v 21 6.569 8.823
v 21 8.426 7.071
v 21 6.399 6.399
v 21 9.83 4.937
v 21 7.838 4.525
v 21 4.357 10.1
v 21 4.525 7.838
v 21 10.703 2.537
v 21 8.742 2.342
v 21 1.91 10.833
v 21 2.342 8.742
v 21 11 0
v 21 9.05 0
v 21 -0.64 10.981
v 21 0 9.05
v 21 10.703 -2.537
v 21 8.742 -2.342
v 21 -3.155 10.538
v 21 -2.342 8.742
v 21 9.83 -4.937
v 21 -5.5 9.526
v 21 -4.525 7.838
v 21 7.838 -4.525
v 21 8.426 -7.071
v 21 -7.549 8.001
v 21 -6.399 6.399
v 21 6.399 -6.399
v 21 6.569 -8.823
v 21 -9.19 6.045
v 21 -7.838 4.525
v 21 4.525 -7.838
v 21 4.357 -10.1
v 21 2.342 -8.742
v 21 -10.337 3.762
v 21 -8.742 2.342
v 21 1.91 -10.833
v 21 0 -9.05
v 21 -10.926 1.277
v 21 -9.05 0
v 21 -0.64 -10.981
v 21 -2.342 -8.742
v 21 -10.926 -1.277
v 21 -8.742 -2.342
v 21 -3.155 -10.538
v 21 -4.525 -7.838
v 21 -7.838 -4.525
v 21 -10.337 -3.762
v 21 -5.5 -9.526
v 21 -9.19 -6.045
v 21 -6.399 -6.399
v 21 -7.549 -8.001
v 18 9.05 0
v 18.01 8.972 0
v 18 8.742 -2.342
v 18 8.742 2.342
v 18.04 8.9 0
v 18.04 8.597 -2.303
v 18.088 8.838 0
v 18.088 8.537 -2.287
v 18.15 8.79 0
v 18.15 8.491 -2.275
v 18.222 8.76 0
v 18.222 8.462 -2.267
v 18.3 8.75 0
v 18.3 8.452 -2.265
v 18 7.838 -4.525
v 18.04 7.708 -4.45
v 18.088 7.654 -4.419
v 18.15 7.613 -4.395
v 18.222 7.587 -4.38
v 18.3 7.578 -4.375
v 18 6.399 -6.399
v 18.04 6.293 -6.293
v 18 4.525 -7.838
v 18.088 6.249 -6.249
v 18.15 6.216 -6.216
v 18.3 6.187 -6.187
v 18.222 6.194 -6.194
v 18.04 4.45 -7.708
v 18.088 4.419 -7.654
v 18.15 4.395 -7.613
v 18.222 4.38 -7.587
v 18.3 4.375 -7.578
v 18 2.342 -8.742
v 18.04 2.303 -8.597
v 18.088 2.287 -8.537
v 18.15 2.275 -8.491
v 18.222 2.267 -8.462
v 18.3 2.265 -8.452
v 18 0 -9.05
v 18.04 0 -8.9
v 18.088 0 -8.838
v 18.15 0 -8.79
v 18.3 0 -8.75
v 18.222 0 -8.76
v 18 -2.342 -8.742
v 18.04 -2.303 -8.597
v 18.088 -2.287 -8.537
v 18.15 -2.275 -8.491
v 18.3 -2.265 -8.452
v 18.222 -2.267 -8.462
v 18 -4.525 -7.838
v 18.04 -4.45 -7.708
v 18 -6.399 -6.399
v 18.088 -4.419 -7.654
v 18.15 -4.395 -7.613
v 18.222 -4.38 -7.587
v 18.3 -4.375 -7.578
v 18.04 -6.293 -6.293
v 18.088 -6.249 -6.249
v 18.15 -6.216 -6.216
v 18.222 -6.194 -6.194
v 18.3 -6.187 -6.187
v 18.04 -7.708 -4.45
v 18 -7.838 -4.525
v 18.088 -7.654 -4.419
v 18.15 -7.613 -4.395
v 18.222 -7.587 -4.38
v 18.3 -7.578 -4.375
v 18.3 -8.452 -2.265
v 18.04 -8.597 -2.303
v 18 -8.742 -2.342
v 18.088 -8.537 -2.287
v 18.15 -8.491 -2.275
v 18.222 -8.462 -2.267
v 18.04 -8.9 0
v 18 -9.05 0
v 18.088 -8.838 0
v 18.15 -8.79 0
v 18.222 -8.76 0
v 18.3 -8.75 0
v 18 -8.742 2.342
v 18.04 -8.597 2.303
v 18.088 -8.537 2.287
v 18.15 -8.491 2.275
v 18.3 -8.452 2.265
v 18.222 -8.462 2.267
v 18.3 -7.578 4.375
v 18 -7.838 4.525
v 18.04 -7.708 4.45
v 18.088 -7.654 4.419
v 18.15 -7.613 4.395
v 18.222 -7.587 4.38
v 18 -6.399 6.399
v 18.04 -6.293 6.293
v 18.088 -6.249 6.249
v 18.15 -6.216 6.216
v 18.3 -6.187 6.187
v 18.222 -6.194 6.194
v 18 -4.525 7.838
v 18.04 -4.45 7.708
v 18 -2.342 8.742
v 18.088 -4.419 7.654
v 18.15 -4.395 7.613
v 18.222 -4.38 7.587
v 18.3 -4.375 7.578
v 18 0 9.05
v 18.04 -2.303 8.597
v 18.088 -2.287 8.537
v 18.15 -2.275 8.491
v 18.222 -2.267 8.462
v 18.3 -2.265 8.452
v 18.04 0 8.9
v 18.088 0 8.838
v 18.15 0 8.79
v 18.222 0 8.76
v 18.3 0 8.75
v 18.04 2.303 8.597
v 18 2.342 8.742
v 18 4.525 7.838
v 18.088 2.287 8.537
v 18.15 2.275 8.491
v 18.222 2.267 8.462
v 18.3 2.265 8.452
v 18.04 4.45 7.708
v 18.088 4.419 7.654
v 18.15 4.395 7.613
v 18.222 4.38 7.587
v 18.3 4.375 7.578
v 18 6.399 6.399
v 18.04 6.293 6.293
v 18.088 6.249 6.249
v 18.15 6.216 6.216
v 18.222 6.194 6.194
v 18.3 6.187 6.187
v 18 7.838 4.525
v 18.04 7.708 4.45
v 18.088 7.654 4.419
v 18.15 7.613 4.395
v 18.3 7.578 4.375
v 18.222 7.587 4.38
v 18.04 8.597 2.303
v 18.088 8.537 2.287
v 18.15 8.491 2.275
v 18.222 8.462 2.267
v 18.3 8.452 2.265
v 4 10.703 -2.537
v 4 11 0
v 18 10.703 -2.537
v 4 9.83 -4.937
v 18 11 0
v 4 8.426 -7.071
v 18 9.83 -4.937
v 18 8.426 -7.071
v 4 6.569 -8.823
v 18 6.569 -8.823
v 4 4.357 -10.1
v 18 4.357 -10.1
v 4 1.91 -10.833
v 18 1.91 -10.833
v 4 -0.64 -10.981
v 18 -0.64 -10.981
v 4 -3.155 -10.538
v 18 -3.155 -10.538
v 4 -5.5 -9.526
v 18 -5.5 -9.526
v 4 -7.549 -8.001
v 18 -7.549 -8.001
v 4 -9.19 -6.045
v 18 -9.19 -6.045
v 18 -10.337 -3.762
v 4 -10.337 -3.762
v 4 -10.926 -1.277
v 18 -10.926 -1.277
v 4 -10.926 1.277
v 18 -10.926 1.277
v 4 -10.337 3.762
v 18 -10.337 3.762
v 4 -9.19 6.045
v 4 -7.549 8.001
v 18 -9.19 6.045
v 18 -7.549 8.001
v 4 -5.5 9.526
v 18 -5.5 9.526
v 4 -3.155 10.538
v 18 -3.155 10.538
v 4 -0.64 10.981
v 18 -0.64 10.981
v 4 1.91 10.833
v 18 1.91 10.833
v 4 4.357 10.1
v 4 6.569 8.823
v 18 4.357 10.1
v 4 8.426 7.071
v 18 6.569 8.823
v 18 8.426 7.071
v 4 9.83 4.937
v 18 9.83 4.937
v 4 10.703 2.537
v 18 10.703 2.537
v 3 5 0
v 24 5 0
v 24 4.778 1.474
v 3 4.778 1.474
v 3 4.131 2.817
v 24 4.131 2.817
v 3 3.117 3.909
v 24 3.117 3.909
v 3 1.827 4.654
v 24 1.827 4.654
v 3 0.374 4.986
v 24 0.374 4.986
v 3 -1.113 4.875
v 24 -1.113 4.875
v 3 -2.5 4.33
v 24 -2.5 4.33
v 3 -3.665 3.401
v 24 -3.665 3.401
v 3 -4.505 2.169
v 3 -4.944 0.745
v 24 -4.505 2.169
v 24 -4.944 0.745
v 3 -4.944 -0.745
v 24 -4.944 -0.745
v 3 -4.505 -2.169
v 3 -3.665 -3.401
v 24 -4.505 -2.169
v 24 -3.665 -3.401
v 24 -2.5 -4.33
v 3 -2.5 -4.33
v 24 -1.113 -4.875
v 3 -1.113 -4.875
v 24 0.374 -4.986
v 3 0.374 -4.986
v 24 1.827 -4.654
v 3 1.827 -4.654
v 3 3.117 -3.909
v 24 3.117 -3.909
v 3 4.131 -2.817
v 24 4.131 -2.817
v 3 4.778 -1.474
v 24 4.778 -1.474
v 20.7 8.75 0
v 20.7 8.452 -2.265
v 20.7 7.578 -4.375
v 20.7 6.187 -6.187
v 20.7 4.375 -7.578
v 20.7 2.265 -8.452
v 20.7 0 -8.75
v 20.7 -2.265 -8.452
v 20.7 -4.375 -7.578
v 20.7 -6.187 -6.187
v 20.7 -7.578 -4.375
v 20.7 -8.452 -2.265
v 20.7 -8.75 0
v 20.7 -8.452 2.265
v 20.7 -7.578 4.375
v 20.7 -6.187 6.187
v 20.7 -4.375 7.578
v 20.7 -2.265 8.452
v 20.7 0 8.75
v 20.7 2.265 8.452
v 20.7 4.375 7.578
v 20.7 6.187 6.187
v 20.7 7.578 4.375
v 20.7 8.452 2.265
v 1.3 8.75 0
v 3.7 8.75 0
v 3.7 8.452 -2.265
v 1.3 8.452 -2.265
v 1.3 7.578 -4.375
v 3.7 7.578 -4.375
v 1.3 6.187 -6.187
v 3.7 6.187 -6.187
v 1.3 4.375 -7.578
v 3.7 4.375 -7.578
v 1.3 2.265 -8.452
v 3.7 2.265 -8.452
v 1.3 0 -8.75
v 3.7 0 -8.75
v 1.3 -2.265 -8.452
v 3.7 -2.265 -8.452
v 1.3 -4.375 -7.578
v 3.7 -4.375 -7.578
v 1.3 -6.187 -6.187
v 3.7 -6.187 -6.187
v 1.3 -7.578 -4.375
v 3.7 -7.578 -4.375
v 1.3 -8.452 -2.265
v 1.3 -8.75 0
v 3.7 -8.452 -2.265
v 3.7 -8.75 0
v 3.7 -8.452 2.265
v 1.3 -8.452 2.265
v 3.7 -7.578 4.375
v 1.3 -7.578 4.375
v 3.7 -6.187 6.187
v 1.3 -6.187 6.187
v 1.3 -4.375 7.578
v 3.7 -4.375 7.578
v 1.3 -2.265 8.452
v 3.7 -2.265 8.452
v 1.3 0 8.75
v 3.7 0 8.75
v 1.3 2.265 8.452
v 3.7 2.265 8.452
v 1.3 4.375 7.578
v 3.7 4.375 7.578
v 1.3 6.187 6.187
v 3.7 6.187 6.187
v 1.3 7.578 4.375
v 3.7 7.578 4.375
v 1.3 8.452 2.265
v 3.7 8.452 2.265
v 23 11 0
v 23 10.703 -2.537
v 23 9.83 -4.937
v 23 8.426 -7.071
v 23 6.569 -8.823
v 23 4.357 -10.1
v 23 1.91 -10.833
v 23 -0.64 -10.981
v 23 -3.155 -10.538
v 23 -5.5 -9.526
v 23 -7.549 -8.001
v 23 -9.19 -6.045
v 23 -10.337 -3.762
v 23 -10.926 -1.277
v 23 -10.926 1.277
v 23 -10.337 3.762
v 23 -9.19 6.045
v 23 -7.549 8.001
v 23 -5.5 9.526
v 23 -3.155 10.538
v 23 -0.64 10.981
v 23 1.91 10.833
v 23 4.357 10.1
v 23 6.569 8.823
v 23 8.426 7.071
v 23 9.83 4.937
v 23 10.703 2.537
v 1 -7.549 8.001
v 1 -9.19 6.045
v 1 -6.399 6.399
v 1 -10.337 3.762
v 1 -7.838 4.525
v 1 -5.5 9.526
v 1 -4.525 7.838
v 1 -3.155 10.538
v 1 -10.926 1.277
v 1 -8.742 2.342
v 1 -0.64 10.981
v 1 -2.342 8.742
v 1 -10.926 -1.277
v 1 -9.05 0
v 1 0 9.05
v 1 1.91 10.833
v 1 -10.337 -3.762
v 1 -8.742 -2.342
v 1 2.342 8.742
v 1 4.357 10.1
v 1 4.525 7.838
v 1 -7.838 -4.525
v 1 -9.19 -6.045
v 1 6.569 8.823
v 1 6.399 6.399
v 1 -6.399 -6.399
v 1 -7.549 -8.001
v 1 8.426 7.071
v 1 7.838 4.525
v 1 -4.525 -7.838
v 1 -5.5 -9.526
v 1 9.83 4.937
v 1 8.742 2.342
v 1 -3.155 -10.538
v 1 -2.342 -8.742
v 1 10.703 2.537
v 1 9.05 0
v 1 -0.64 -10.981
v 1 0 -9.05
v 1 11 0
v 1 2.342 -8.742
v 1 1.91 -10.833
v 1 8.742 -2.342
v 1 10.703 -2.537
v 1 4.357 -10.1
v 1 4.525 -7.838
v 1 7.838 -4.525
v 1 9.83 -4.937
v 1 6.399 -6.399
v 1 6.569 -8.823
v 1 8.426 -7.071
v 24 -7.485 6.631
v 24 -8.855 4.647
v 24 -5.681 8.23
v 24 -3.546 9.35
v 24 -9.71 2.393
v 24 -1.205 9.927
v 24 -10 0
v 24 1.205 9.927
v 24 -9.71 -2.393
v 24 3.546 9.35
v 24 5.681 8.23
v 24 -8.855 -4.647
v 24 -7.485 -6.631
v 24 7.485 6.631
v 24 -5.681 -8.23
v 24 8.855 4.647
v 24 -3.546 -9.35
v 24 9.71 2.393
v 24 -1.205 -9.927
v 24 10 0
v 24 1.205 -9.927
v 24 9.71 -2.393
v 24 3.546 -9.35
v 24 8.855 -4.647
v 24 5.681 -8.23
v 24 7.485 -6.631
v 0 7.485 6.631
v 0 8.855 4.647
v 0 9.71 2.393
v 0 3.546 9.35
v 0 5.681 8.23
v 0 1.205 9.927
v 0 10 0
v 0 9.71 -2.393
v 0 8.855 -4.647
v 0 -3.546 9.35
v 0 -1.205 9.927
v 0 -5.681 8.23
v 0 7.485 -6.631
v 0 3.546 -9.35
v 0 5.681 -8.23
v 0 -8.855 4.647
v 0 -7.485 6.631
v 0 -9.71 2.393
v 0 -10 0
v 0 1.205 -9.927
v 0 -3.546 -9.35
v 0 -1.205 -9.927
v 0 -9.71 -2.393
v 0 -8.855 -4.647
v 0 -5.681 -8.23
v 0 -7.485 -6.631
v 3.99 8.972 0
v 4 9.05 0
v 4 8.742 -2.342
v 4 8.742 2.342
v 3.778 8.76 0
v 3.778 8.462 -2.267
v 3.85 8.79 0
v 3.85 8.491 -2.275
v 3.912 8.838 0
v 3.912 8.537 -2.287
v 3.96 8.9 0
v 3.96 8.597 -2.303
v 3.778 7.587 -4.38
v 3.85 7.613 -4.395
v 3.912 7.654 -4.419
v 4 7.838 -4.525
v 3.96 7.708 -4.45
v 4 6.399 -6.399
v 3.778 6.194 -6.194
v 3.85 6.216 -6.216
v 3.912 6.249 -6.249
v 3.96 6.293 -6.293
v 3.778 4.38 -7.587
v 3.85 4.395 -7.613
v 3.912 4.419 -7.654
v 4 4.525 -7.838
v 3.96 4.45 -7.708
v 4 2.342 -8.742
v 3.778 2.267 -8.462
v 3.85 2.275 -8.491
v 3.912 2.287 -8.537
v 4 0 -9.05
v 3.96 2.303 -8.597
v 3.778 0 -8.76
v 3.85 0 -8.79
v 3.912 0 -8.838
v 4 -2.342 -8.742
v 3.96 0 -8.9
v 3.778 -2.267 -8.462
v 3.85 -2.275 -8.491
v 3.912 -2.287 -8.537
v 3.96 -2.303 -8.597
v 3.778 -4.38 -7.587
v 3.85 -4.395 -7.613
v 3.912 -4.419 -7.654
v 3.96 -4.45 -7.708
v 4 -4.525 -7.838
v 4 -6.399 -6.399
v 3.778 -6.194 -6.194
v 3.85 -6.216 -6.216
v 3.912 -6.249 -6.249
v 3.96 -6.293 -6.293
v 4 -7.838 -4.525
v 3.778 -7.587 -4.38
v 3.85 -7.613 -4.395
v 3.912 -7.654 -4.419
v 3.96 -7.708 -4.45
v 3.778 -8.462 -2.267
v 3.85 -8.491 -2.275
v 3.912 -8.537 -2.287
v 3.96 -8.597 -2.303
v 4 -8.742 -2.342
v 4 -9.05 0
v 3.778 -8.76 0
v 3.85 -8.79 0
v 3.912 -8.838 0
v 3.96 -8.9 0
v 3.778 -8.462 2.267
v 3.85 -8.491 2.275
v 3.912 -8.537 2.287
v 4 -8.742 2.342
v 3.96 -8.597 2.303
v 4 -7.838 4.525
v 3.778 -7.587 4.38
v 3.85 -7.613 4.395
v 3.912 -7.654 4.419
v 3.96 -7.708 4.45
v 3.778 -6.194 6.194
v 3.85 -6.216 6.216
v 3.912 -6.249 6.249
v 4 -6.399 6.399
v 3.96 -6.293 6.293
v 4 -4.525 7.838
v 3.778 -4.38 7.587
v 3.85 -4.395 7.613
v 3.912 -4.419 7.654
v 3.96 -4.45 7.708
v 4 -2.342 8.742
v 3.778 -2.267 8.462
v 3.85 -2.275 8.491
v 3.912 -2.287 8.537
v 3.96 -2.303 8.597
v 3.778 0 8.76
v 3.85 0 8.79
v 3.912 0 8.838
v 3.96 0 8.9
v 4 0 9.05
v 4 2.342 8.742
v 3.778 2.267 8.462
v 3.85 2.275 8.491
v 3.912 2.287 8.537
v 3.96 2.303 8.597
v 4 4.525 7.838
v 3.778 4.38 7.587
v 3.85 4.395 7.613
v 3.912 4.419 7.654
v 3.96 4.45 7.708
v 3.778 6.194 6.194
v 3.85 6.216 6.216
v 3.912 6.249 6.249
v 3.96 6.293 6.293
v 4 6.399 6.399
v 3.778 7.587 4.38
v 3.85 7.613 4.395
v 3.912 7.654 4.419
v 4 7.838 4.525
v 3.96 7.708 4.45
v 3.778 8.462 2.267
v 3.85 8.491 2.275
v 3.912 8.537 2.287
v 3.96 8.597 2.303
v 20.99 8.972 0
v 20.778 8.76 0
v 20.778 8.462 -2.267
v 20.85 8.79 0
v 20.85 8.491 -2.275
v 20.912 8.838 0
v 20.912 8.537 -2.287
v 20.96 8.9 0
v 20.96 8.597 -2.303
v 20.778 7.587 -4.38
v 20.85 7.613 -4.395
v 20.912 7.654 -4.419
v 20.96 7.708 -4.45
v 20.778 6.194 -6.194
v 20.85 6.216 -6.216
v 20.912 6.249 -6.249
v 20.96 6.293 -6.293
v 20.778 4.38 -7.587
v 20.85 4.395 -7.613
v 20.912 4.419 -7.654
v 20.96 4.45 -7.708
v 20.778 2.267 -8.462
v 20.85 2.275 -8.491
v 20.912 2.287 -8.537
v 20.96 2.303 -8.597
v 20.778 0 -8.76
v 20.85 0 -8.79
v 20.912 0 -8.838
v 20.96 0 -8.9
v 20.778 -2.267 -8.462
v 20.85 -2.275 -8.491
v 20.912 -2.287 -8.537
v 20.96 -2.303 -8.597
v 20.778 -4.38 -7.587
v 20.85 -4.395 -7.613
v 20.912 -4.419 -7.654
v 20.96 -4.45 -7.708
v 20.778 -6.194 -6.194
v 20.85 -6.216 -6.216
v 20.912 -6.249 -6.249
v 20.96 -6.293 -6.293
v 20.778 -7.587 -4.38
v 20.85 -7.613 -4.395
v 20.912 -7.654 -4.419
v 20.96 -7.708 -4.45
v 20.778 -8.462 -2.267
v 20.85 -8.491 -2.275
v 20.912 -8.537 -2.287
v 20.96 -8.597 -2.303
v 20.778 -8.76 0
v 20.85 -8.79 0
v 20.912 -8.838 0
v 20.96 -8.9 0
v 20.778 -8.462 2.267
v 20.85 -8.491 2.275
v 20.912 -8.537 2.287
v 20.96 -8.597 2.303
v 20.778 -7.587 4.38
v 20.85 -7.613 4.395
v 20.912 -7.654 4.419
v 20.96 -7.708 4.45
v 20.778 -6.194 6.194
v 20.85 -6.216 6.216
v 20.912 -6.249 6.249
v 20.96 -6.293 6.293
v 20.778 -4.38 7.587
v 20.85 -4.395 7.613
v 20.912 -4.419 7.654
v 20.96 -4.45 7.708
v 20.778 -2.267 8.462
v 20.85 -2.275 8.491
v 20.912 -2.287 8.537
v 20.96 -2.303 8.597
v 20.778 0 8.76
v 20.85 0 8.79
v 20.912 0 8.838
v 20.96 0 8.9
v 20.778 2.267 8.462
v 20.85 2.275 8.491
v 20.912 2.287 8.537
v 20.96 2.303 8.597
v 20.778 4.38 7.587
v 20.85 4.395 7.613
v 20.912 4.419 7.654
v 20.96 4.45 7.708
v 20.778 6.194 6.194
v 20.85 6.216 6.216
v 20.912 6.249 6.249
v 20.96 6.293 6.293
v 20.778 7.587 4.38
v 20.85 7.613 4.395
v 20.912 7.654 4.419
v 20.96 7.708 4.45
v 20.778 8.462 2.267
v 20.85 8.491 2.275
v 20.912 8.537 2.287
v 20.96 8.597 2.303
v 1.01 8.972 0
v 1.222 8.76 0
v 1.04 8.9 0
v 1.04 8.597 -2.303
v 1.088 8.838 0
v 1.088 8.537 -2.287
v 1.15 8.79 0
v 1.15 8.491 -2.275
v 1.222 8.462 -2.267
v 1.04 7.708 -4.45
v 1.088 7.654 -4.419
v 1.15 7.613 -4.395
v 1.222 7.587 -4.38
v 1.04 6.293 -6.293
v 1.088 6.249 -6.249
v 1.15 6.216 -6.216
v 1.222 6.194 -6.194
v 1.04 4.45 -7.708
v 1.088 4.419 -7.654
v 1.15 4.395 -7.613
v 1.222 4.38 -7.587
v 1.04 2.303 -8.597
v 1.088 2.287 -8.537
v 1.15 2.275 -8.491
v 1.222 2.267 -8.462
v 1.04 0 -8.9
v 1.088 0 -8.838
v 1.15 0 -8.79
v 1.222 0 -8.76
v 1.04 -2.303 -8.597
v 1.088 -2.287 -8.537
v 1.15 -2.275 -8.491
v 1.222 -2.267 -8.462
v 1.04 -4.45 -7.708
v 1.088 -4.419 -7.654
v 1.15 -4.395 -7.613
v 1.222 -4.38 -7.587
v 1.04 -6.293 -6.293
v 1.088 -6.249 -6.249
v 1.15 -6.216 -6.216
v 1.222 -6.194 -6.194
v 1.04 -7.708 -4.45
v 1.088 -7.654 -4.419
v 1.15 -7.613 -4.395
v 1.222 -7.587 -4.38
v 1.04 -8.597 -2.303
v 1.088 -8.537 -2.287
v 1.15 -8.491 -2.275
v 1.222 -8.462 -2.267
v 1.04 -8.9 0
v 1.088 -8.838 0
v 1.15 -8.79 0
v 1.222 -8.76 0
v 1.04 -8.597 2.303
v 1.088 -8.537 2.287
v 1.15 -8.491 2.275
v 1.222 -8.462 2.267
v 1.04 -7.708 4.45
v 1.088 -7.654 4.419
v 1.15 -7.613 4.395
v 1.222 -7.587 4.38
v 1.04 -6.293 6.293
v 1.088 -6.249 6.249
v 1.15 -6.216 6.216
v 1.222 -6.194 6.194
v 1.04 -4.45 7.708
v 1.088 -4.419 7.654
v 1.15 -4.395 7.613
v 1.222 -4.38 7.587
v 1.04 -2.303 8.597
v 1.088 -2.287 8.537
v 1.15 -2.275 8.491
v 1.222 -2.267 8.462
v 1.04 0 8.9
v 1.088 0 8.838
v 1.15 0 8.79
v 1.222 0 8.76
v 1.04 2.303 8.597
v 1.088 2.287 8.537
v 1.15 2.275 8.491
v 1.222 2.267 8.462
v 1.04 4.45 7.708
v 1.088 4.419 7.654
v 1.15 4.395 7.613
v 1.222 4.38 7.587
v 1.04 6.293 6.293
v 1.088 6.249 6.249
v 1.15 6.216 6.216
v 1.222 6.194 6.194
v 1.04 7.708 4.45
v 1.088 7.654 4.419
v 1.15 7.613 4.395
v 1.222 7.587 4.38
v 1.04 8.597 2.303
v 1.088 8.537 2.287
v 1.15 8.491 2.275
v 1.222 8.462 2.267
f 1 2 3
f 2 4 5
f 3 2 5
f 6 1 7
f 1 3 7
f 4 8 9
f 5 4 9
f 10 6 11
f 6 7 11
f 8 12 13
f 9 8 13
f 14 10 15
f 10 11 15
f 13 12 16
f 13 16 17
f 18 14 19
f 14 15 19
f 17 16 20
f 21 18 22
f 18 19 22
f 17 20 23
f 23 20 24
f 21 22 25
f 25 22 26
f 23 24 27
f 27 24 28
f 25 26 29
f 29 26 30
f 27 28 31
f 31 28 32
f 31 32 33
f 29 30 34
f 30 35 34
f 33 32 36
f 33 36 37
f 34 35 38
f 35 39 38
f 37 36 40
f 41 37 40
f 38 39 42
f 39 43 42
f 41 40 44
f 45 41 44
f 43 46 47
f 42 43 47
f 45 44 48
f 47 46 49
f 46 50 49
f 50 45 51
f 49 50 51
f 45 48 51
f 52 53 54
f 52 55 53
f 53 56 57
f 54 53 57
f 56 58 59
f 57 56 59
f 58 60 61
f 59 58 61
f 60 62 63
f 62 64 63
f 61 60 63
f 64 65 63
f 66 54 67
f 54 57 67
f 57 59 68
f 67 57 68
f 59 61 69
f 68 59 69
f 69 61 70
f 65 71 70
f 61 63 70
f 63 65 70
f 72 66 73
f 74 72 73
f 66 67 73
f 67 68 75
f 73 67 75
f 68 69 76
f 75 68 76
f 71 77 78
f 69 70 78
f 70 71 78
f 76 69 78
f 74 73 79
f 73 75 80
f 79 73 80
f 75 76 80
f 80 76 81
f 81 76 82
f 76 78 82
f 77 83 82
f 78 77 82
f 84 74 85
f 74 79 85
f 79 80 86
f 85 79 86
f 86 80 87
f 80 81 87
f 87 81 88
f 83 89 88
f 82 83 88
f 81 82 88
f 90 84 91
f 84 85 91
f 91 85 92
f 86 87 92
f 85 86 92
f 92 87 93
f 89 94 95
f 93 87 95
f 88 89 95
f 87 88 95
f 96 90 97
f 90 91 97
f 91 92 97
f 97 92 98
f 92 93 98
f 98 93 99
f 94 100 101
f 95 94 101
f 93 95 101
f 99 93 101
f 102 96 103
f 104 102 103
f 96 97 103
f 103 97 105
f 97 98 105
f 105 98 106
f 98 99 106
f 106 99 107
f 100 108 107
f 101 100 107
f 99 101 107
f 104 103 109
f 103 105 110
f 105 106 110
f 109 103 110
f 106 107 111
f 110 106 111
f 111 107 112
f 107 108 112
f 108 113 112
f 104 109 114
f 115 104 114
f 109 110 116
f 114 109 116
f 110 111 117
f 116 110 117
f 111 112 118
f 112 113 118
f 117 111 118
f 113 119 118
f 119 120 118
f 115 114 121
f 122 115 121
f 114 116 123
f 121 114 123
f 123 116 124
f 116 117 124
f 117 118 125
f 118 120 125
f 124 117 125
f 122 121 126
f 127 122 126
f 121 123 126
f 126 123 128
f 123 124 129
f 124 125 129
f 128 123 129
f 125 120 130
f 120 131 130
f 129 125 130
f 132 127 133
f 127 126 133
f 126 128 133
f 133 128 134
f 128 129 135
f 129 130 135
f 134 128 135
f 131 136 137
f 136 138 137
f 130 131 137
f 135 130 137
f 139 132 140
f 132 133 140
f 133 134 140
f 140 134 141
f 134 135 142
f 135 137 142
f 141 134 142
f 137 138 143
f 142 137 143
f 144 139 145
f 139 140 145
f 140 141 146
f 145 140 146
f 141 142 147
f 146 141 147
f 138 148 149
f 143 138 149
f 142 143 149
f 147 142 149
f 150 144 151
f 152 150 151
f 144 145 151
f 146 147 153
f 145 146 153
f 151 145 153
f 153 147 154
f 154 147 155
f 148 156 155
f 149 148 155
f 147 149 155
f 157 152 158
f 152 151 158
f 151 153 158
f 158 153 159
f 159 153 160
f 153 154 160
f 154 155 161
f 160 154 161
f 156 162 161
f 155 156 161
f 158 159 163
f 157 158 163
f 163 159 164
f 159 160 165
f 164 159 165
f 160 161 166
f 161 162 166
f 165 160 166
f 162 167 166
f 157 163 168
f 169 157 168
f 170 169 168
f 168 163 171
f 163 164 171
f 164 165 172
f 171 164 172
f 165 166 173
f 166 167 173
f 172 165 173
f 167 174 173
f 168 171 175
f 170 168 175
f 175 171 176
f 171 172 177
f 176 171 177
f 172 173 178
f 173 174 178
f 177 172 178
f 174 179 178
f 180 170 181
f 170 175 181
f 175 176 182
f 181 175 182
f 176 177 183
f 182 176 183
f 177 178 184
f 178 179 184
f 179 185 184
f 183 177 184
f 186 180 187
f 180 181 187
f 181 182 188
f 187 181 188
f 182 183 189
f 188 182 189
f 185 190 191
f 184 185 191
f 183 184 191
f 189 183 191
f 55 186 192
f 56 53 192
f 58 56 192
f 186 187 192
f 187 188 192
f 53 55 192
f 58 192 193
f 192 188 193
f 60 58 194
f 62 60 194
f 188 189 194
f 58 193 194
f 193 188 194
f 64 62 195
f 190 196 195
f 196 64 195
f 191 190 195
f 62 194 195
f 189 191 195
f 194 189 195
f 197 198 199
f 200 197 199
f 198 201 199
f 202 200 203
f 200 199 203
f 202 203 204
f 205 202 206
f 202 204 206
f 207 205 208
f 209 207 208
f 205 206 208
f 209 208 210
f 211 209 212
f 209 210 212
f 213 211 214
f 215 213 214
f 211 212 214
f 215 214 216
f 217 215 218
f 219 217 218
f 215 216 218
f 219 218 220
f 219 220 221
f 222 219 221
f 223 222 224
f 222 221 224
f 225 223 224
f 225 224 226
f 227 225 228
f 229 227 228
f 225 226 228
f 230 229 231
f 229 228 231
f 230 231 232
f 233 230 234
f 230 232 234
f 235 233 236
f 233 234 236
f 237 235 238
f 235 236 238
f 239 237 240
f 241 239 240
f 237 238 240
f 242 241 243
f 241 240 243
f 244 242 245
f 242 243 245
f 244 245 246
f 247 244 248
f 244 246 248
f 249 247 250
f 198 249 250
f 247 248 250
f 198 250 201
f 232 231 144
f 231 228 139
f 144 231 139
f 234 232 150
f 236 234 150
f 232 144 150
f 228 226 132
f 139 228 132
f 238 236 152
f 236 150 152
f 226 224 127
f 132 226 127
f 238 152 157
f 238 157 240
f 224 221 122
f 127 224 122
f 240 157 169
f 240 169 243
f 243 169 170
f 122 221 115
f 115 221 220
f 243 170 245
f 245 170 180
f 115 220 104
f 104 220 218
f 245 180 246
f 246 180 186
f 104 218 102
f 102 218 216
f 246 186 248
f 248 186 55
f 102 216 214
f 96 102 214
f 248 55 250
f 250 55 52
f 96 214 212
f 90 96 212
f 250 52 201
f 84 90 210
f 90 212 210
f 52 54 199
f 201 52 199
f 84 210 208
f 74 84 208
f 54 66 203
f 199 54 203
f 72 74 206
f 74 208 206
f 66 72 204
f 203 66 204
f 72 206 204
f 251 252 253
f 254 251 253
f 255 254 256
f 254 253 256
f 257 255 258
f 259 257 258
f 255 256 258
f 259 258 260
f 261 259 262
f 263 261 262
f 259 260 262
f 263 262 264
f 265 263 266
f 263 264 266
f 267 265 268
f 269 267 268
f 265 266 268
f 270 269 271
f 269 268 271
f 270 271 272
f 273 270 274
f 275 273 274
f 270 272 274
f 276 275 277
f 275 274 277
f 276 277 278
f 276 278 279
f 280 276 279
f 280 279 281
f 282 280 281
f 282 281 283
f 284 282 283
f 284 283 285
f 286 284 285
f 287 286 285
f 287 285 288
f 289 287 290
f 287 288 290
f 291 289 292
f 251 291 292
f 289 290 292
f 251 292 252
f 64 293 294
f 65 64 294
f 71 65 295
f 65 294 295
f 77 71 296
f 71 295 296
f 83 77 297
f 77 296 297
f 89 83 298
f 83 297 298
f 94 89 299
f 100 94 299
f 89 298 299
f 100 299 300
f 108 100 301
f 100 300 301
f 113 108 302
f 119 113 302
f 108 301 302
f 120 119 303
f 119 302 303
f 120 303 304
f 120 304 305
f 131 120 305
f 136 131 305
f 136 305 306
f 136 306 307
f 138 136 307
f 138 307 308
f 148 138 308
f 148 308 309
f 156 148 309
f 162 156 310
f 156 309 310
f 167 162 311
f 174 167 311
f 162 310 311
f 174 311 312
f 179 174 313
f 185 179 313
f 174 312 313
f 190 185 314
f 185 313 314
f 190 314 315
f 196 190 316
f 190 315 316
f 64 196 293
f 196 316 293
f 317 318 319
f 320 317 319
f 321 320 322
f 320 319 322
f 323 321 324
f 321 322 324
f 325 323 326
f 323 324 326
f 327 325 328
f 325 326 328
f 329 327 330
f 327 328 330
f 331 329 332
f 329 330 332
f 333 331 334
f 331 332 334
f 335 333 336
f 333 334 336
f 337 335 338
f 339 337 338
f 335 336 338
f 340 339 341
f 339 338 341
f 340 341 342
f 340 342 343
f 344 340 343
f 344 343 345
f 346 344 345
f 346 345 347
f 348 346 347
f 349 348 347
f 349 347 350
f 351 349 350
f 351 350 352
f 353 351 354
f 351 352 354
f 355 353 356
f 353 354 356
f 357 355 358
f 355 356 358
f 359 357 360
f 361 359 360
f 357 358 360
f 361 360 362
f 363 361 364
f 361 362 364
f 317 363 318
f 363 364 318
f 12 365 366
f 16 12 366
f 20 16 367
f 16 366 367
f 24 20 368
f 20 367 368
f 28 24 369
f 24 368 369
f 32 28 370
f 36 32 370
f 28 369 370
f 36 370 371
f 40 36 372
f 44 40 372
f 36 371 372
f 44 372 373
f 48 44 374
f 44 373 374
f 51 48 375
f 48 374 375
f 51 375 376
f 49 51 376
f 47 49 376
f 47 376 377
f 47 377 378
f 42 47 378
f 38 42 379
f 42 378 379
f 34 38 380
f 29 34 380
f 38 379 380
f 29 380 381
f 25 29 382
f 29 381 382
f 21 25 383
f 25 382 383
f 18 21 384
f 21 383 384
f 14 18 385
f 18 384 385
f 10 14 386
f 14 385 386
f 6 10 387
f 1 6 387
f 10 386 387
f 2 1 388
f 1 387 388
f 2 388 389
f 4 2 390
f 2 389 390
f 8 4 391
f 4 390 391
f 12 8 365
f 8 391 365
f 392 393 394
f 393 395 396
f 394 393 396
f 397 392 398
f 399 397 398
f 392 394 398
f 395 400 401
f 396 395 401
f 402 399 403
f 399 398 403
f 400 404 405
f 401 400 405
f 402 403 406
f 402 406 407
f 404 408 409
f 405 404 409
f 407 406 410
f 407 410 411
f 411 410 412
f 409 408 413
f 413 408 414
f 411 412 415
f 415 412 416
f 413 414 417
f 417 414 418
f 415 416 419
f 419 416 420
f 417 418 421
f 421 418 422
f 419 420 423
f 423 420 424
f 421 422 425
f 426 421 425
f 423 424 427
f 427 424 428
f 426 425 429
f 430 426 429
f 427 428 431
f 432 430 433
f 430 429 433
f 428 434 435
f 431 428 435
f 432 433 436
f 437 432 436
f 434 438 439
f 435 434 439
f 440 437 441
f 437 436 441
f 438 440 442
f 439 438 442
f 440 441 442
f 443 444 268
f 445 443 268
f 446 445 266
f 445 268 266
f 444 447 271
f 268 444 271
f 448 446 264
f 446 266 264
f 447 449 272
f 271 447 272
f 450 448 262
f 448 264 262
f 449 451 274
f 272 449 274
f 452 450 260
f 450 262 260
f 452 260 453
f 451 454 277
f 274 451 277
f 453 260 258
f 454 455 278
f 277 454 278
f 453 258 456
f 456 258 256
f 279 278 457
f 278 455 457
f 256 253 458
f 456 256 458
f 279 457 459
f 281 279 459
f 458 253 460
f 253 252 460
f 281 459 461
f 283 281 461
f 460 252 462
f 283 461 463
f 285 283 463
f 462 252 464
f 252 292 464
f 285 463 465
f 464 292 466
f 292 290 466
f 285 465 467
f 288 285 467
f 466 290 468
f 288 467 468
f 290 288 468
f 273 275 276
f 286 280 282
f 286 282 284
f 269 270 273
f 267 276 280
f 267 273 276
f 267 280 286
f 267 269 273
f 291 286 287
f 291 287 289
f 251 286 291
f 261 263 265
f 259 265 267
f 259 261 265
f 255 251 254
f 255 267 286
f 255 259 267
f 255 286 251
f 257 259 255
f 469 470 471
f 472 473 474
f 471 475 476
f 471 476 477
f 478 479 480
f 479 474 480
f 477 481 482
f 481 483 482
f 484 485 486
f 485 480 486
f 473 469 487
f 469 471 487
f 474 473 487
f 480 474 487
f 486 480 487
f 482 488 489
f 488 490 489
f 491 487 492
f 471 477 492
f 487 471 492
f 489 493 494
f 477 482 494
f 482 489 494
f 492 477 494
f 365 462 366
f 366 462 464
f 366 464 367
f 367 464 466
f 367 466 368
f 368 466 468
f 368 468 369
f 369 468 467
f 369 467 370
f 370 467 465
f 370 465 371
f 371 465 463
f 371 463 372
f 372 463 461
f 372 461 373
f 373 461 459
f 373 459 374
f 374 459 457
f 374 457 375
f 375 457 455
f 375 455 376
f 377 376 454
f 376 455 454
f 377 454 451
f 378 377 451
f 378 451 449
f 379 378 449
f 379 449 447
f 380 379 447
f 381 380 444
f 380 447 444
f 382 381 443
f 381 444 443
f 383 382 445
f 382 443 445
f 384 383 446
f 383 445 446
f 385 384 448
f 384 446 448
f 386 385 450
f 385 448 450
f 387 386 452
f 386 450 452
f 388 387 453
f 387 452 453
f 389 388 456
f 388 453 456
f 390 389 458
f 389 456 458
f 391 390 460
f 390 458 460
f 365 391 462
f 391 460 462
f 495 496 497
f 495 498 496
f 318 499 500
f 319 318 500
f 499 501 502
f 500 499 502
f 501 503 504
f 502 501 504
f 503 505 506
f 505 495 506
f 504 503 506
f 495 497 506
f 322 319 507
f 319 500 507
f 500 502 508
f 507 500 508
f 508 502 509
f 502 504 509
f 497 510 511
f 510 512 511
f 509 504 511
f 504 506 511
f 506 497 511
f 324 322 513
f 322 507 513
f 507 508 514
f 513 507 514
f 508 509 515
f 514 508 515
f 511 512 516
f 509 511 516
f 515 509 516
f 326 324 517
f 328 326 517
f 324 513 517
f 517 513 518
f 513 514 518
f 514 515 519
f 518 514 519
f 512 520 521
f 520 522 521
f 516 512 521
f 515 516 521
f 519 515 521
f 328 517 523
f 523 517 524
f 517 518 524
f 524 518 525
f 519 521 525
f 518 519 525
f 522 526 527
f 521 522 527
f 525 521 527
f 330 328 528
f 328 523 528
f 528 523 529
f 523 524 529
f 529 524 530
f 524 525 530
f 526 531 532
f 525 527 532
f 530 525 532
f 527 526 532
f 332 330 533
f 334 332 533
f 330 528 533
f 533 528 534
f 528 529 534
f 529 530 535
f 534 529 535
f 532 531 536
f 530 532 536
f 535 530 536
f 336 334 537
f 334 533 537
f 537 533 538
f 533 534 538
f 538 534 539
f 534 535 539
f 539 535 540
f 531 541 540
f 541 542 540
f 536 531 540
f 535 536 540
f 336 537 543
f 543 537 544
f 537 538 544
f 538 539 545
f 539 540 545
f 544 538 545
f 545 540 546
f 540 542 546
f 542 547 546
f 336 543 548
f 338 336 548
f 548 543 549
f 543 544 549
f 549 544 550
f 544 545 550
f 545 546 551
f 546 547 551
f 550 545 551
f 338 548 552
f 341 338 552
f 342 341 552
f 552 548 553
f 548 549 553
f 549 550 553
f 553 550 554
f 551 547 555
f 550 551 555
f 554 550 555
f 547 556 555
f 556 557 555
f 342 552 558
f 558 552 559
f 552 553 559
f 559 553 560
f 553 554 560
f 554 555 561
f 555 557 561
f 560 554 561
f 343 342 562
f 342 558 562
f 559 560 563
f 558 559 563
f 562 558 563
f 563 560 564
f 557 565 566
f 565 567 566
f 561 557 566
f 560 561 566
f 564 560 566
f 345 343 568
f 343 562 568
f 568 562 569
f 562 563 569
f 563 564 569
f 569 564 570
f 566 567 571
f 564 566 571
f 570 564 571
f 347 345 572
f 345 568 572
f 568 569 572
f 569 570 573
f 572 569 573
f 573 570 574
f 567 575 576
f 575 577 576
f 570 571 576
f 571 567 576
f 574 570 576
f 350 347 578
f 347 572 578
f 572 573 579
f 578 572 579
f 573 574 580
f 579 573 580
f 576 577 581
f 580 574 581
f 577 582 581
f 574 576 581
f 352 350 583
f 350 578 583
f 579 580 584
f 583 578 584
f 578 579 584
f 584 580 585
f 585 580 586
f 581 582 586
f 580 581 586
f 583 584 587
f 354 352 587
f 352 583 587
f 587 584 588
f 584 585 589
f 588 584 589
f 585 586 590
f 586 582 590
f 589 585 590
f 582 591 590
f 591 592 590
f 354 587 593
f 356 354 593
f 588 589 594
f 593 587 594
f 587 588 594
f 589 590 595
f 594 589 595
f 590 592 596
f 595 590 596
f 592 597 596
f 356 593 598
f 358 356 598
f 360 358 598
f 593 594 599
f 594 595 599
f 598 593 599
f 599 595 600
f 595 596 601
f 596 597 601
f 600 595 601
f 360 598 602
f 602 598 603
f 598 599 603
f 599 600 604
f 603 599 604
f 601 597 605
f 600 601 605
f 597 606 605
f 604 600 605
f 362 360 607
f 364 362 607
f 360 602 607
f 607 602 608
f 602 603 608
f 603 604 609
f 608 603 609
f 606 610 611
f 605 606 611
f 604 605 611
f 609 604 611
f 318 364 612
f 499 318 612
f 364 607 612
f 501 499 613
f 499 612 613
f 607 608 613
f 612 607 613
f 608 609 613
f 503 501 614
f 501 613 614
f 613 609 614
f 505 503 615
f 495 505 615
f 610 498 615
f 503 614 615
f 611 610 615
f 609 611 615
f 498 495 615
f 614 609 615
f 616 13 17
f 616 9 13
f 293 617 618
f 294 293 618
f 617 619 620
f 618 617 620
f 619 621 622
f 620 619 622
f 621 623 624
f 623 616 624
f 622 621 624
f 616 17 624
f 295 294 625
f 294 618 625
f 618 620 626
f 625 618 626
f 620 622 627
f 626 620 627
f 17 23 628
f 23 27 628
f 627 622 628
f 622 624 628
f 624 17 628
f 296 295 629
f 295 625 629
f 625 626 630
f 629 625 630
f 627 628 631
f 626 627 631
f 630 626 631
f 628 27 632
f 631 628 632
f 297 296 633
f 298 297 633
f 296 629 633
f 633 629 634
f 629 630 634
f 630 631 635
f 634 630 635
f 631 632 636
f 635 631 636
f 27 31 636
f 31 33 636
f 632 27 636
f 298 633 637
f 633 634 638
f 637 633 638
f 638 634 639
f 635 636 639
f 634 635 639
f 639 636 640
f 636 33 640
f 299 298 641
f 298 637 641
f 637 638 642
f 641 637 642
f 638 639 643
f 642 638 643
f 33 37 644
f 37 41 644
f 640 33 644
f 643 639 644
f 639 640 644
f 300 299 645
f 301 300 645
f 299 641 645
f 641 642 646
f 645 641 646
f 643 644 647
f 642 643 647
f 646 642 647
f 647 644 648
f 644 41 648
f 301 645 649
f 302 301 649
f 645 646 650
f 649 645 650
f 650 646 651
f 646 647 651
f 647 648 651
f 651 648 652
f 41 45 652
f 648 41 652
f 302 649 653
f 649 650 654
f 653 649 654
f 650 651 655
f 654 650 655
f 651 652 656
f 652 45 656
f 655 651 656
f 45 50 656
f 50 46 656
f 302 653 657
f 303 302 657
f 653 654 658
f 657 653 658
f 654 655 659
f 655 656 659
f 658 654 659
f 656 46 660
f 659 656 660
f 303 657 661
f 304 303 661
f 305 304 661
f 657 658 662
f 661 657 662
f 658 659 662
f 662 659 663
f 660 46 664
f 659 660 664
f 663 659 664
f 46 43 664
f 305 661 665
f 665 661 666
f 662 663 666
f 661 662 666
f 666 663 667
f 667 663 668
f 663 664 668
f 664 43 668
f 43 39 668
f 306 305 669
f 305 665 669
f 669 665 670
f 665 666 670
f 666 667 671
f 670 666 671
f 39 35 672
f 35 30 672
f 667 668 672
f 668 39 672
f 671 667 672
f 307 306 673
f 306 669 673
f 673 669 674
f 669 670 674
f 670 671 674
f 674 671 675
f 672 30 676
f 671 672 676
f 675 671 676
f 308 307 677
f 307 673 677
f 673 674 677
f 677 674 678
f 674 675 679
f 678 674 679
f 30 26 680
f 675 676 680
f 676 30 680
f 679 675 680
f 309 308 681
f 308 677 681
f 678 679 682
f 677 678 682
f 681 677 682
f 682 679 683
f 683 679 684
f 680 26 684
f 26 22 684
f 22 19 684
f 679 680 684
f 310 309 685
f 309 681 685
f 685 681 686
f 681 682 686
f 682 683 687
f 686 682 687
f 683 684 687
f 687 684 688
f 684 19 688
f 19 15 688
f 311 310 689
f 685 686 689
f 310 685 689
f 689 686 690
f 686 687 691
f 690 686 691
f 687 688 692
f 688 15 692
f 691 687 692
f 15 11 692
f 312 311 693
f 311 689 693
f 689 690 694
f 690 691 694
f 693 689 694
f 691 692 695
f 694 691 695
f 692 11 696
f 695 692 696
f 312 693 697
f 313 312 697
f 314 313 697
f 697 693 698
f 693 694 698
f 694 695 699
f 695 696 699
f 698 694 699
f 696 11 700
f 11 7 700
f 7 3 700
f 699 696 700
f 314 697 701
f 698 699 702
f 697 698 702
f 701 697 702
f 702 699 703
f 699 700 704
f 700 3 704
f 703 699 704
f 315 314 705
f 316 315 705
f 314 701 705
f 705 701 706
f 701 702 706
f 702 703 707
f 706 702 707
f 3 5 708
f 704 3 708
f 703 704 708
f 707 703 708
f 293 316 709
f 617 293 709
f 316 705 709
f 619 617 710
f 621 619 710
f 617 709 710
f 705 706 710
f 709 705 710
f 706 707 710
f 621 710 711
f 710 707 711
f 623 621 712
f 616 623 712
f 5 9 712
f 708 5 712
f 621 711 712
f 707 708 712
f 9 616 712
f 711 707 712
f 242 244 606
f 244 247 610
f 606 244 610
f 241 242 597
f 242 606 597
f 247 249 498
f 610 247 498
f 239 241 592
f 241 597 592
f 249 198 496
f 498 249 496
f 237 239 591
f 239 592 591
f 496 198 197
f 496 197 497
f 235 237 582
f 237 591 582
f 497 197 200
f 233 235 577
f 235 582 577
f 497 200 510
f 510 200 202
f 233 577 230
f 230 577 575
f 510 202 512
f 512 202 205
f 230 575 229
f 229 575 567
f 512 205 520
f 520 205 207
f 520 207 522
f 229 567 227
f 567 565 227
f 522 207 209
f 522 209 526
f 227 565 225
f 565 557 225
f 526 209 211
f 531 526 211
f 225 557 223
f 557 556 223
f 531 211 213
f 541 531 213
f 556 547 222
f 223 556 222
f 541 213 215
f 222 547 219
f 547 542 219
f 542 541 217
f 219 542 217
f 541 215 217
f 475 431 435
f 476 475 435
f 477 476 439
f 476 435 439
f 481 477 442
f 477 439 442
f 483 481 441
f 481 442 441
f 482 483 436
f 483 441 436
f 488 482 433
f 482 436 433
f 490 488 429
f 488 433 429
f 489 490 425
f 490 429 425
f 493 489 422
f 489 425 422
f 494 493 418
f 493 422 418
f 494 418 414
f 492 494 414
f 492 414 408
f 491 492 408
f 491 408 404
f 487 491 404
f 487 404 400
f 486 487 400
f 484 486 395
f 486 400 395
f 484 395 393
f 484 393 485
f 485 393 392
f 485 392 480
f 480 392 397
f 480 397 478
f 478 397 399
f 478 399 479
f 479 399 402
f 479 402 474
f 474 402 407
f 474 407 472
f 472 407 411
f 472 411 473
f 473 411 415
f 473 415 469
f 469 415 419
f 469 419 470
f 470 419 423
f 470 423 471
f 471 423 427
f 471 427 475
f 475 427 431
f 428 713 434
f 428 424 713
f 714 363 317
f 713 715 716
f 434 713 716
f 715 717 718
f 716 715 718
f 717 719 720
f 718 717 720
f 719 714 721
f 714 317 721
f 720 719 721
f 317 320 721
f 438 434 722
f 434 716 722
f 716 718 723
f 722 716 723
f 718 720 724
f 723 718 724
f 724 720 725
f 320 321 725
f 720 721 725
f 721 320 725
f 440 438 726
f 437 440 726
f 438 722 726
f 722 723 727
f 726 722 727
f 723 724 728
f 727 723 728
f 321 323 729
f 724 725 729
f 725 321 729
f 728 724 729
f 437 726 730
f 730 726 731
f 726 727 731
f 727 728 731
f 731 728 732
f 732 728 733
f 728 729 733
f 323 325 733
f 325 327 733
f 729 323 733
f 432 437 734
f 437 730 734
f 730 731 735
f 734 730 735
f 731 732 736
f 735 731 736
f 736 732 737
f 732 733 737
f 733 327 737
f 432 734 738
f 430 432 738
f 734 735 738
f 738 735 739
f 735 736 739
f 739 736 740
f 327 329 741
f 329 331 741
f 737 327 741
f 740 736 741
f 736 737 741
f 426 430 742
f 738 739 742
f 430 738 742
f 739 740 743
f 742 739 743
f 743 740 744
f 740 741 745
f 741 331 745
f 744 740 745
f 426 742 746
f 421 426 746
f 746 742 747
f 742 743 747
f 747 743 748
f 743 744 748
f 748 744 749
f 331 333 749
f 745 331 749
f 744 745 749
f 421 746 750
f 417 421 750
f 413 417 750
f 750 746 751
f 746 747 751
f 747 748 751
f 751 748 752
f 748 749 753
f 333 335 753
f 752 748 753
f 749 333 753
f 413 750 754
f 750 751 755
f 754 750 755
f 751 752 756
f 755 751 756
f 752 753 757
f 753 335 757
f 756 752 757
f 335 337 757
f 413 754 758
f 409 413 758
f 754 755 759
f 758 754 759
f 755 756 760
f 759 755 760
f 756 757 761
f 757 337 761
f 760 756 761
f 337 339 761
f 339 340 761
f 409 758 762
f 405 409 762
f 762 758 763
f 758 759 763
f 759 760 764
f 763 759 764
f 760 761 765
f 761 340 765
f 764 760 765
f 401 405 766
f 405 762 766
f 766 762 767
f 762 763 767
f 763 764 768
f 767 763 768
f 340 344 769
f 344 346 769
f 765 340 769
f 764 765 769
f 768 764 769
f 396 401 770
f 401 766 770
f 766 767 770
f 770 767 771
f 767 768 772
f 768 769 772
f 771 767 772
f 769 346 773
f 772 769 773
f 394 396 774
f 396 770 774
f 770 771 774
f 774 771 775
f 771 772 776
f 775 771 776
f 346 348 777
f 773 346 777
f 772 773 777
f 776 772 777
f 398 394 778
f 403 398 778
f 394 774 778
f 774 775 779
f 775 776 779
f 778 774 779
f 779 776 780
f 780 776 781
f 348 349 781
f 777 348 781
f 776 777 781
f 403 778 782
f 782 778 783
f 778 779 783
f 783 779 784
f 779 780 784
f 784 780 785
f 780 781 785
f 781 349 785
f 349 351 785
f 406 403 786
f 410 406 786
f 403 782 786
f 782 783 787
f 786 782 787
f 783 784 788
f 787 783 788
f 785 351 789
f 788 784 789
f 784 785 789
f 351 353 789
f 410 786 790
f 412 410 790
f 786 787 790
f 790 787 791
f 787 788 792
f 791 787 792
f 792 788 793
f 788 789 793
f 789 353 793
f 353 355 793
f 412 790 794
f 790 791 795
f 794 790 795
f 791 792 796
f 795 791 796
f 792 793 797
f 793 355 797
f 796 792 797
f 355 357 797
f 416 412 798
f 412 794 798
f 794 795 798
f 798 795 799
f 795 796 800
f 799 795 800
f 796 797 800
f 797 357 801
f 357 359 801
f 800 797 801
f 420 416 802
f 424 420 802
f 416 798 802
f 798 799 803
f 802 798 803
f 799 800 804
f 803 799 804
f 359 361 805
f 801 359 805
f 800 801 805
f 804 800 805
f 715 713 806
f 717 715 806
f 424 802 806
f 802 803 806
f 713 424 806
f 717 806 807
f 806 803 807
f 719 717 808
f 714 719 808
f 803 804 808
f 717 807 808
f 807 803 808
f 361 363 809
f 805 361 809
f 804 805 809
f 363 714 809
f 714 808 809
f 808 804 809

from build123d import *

# Parameters (mm, degrees)
SCHIZZO2_R               = 5
TAGLIO_ESTRUSIONE1_DEPTH = 21
SMUSSO1_SIZE             = 1
RACCORDO1_R              = 0.3


with BuildPart() as part:
    # Schizzo1 → Rivoluzione1 (revolve)
    with BuildSketch(Plane.XY):
        Polygon((0, 0), (0, 11), (1, 11), (1, 8.75), (4, 8.75), (4, 11), (18, 11), (18, 8.75), (21, 8.75), (21, 11), (24, 11), (24, 0), align=None)
    revolve(axis=Axis((24, 0, 0), (-1, 0, 0)))

    # Schizzo2 → Taglio-Estrusione1 (cut)
    with BuildSketch(Plane(origin=(24, 0, 0), x_dir=(0, 0, -1), z_dir=(1, 0, 0))):
        with Locations(Location((0, 0, 0), (0, 0, 90))):
            Circle(SCHIZZO2_R)
    extrude(amount=-TAGLIO_ESTRUSIONE1_DEPTH, mode=Mode.SUBTRACT)

    # Smusso1
    smusso1_edges = [part.edges().sort_by_distance(p)[0] for p in [
        (0, -11, 0),
        (24, -11, 0),
    ]]
    chamfer(smusso1_edges, length=SMUSSO1_SIZE - 0.0001)  # a hair under: the kernel refuses the full size

    # Raccordo1
    raccordo1_edges = [part.edges().sort_by_distance(p)[0] for p in [
        (21, -8.75, 0),
        (18, -8.75, 0),
        (4, -8.75, 0),
        (1, -8.75, 0),
    ]]
    fillet(raccordo1_edges, radius=RACCORDO1_R)


solid = part.part
